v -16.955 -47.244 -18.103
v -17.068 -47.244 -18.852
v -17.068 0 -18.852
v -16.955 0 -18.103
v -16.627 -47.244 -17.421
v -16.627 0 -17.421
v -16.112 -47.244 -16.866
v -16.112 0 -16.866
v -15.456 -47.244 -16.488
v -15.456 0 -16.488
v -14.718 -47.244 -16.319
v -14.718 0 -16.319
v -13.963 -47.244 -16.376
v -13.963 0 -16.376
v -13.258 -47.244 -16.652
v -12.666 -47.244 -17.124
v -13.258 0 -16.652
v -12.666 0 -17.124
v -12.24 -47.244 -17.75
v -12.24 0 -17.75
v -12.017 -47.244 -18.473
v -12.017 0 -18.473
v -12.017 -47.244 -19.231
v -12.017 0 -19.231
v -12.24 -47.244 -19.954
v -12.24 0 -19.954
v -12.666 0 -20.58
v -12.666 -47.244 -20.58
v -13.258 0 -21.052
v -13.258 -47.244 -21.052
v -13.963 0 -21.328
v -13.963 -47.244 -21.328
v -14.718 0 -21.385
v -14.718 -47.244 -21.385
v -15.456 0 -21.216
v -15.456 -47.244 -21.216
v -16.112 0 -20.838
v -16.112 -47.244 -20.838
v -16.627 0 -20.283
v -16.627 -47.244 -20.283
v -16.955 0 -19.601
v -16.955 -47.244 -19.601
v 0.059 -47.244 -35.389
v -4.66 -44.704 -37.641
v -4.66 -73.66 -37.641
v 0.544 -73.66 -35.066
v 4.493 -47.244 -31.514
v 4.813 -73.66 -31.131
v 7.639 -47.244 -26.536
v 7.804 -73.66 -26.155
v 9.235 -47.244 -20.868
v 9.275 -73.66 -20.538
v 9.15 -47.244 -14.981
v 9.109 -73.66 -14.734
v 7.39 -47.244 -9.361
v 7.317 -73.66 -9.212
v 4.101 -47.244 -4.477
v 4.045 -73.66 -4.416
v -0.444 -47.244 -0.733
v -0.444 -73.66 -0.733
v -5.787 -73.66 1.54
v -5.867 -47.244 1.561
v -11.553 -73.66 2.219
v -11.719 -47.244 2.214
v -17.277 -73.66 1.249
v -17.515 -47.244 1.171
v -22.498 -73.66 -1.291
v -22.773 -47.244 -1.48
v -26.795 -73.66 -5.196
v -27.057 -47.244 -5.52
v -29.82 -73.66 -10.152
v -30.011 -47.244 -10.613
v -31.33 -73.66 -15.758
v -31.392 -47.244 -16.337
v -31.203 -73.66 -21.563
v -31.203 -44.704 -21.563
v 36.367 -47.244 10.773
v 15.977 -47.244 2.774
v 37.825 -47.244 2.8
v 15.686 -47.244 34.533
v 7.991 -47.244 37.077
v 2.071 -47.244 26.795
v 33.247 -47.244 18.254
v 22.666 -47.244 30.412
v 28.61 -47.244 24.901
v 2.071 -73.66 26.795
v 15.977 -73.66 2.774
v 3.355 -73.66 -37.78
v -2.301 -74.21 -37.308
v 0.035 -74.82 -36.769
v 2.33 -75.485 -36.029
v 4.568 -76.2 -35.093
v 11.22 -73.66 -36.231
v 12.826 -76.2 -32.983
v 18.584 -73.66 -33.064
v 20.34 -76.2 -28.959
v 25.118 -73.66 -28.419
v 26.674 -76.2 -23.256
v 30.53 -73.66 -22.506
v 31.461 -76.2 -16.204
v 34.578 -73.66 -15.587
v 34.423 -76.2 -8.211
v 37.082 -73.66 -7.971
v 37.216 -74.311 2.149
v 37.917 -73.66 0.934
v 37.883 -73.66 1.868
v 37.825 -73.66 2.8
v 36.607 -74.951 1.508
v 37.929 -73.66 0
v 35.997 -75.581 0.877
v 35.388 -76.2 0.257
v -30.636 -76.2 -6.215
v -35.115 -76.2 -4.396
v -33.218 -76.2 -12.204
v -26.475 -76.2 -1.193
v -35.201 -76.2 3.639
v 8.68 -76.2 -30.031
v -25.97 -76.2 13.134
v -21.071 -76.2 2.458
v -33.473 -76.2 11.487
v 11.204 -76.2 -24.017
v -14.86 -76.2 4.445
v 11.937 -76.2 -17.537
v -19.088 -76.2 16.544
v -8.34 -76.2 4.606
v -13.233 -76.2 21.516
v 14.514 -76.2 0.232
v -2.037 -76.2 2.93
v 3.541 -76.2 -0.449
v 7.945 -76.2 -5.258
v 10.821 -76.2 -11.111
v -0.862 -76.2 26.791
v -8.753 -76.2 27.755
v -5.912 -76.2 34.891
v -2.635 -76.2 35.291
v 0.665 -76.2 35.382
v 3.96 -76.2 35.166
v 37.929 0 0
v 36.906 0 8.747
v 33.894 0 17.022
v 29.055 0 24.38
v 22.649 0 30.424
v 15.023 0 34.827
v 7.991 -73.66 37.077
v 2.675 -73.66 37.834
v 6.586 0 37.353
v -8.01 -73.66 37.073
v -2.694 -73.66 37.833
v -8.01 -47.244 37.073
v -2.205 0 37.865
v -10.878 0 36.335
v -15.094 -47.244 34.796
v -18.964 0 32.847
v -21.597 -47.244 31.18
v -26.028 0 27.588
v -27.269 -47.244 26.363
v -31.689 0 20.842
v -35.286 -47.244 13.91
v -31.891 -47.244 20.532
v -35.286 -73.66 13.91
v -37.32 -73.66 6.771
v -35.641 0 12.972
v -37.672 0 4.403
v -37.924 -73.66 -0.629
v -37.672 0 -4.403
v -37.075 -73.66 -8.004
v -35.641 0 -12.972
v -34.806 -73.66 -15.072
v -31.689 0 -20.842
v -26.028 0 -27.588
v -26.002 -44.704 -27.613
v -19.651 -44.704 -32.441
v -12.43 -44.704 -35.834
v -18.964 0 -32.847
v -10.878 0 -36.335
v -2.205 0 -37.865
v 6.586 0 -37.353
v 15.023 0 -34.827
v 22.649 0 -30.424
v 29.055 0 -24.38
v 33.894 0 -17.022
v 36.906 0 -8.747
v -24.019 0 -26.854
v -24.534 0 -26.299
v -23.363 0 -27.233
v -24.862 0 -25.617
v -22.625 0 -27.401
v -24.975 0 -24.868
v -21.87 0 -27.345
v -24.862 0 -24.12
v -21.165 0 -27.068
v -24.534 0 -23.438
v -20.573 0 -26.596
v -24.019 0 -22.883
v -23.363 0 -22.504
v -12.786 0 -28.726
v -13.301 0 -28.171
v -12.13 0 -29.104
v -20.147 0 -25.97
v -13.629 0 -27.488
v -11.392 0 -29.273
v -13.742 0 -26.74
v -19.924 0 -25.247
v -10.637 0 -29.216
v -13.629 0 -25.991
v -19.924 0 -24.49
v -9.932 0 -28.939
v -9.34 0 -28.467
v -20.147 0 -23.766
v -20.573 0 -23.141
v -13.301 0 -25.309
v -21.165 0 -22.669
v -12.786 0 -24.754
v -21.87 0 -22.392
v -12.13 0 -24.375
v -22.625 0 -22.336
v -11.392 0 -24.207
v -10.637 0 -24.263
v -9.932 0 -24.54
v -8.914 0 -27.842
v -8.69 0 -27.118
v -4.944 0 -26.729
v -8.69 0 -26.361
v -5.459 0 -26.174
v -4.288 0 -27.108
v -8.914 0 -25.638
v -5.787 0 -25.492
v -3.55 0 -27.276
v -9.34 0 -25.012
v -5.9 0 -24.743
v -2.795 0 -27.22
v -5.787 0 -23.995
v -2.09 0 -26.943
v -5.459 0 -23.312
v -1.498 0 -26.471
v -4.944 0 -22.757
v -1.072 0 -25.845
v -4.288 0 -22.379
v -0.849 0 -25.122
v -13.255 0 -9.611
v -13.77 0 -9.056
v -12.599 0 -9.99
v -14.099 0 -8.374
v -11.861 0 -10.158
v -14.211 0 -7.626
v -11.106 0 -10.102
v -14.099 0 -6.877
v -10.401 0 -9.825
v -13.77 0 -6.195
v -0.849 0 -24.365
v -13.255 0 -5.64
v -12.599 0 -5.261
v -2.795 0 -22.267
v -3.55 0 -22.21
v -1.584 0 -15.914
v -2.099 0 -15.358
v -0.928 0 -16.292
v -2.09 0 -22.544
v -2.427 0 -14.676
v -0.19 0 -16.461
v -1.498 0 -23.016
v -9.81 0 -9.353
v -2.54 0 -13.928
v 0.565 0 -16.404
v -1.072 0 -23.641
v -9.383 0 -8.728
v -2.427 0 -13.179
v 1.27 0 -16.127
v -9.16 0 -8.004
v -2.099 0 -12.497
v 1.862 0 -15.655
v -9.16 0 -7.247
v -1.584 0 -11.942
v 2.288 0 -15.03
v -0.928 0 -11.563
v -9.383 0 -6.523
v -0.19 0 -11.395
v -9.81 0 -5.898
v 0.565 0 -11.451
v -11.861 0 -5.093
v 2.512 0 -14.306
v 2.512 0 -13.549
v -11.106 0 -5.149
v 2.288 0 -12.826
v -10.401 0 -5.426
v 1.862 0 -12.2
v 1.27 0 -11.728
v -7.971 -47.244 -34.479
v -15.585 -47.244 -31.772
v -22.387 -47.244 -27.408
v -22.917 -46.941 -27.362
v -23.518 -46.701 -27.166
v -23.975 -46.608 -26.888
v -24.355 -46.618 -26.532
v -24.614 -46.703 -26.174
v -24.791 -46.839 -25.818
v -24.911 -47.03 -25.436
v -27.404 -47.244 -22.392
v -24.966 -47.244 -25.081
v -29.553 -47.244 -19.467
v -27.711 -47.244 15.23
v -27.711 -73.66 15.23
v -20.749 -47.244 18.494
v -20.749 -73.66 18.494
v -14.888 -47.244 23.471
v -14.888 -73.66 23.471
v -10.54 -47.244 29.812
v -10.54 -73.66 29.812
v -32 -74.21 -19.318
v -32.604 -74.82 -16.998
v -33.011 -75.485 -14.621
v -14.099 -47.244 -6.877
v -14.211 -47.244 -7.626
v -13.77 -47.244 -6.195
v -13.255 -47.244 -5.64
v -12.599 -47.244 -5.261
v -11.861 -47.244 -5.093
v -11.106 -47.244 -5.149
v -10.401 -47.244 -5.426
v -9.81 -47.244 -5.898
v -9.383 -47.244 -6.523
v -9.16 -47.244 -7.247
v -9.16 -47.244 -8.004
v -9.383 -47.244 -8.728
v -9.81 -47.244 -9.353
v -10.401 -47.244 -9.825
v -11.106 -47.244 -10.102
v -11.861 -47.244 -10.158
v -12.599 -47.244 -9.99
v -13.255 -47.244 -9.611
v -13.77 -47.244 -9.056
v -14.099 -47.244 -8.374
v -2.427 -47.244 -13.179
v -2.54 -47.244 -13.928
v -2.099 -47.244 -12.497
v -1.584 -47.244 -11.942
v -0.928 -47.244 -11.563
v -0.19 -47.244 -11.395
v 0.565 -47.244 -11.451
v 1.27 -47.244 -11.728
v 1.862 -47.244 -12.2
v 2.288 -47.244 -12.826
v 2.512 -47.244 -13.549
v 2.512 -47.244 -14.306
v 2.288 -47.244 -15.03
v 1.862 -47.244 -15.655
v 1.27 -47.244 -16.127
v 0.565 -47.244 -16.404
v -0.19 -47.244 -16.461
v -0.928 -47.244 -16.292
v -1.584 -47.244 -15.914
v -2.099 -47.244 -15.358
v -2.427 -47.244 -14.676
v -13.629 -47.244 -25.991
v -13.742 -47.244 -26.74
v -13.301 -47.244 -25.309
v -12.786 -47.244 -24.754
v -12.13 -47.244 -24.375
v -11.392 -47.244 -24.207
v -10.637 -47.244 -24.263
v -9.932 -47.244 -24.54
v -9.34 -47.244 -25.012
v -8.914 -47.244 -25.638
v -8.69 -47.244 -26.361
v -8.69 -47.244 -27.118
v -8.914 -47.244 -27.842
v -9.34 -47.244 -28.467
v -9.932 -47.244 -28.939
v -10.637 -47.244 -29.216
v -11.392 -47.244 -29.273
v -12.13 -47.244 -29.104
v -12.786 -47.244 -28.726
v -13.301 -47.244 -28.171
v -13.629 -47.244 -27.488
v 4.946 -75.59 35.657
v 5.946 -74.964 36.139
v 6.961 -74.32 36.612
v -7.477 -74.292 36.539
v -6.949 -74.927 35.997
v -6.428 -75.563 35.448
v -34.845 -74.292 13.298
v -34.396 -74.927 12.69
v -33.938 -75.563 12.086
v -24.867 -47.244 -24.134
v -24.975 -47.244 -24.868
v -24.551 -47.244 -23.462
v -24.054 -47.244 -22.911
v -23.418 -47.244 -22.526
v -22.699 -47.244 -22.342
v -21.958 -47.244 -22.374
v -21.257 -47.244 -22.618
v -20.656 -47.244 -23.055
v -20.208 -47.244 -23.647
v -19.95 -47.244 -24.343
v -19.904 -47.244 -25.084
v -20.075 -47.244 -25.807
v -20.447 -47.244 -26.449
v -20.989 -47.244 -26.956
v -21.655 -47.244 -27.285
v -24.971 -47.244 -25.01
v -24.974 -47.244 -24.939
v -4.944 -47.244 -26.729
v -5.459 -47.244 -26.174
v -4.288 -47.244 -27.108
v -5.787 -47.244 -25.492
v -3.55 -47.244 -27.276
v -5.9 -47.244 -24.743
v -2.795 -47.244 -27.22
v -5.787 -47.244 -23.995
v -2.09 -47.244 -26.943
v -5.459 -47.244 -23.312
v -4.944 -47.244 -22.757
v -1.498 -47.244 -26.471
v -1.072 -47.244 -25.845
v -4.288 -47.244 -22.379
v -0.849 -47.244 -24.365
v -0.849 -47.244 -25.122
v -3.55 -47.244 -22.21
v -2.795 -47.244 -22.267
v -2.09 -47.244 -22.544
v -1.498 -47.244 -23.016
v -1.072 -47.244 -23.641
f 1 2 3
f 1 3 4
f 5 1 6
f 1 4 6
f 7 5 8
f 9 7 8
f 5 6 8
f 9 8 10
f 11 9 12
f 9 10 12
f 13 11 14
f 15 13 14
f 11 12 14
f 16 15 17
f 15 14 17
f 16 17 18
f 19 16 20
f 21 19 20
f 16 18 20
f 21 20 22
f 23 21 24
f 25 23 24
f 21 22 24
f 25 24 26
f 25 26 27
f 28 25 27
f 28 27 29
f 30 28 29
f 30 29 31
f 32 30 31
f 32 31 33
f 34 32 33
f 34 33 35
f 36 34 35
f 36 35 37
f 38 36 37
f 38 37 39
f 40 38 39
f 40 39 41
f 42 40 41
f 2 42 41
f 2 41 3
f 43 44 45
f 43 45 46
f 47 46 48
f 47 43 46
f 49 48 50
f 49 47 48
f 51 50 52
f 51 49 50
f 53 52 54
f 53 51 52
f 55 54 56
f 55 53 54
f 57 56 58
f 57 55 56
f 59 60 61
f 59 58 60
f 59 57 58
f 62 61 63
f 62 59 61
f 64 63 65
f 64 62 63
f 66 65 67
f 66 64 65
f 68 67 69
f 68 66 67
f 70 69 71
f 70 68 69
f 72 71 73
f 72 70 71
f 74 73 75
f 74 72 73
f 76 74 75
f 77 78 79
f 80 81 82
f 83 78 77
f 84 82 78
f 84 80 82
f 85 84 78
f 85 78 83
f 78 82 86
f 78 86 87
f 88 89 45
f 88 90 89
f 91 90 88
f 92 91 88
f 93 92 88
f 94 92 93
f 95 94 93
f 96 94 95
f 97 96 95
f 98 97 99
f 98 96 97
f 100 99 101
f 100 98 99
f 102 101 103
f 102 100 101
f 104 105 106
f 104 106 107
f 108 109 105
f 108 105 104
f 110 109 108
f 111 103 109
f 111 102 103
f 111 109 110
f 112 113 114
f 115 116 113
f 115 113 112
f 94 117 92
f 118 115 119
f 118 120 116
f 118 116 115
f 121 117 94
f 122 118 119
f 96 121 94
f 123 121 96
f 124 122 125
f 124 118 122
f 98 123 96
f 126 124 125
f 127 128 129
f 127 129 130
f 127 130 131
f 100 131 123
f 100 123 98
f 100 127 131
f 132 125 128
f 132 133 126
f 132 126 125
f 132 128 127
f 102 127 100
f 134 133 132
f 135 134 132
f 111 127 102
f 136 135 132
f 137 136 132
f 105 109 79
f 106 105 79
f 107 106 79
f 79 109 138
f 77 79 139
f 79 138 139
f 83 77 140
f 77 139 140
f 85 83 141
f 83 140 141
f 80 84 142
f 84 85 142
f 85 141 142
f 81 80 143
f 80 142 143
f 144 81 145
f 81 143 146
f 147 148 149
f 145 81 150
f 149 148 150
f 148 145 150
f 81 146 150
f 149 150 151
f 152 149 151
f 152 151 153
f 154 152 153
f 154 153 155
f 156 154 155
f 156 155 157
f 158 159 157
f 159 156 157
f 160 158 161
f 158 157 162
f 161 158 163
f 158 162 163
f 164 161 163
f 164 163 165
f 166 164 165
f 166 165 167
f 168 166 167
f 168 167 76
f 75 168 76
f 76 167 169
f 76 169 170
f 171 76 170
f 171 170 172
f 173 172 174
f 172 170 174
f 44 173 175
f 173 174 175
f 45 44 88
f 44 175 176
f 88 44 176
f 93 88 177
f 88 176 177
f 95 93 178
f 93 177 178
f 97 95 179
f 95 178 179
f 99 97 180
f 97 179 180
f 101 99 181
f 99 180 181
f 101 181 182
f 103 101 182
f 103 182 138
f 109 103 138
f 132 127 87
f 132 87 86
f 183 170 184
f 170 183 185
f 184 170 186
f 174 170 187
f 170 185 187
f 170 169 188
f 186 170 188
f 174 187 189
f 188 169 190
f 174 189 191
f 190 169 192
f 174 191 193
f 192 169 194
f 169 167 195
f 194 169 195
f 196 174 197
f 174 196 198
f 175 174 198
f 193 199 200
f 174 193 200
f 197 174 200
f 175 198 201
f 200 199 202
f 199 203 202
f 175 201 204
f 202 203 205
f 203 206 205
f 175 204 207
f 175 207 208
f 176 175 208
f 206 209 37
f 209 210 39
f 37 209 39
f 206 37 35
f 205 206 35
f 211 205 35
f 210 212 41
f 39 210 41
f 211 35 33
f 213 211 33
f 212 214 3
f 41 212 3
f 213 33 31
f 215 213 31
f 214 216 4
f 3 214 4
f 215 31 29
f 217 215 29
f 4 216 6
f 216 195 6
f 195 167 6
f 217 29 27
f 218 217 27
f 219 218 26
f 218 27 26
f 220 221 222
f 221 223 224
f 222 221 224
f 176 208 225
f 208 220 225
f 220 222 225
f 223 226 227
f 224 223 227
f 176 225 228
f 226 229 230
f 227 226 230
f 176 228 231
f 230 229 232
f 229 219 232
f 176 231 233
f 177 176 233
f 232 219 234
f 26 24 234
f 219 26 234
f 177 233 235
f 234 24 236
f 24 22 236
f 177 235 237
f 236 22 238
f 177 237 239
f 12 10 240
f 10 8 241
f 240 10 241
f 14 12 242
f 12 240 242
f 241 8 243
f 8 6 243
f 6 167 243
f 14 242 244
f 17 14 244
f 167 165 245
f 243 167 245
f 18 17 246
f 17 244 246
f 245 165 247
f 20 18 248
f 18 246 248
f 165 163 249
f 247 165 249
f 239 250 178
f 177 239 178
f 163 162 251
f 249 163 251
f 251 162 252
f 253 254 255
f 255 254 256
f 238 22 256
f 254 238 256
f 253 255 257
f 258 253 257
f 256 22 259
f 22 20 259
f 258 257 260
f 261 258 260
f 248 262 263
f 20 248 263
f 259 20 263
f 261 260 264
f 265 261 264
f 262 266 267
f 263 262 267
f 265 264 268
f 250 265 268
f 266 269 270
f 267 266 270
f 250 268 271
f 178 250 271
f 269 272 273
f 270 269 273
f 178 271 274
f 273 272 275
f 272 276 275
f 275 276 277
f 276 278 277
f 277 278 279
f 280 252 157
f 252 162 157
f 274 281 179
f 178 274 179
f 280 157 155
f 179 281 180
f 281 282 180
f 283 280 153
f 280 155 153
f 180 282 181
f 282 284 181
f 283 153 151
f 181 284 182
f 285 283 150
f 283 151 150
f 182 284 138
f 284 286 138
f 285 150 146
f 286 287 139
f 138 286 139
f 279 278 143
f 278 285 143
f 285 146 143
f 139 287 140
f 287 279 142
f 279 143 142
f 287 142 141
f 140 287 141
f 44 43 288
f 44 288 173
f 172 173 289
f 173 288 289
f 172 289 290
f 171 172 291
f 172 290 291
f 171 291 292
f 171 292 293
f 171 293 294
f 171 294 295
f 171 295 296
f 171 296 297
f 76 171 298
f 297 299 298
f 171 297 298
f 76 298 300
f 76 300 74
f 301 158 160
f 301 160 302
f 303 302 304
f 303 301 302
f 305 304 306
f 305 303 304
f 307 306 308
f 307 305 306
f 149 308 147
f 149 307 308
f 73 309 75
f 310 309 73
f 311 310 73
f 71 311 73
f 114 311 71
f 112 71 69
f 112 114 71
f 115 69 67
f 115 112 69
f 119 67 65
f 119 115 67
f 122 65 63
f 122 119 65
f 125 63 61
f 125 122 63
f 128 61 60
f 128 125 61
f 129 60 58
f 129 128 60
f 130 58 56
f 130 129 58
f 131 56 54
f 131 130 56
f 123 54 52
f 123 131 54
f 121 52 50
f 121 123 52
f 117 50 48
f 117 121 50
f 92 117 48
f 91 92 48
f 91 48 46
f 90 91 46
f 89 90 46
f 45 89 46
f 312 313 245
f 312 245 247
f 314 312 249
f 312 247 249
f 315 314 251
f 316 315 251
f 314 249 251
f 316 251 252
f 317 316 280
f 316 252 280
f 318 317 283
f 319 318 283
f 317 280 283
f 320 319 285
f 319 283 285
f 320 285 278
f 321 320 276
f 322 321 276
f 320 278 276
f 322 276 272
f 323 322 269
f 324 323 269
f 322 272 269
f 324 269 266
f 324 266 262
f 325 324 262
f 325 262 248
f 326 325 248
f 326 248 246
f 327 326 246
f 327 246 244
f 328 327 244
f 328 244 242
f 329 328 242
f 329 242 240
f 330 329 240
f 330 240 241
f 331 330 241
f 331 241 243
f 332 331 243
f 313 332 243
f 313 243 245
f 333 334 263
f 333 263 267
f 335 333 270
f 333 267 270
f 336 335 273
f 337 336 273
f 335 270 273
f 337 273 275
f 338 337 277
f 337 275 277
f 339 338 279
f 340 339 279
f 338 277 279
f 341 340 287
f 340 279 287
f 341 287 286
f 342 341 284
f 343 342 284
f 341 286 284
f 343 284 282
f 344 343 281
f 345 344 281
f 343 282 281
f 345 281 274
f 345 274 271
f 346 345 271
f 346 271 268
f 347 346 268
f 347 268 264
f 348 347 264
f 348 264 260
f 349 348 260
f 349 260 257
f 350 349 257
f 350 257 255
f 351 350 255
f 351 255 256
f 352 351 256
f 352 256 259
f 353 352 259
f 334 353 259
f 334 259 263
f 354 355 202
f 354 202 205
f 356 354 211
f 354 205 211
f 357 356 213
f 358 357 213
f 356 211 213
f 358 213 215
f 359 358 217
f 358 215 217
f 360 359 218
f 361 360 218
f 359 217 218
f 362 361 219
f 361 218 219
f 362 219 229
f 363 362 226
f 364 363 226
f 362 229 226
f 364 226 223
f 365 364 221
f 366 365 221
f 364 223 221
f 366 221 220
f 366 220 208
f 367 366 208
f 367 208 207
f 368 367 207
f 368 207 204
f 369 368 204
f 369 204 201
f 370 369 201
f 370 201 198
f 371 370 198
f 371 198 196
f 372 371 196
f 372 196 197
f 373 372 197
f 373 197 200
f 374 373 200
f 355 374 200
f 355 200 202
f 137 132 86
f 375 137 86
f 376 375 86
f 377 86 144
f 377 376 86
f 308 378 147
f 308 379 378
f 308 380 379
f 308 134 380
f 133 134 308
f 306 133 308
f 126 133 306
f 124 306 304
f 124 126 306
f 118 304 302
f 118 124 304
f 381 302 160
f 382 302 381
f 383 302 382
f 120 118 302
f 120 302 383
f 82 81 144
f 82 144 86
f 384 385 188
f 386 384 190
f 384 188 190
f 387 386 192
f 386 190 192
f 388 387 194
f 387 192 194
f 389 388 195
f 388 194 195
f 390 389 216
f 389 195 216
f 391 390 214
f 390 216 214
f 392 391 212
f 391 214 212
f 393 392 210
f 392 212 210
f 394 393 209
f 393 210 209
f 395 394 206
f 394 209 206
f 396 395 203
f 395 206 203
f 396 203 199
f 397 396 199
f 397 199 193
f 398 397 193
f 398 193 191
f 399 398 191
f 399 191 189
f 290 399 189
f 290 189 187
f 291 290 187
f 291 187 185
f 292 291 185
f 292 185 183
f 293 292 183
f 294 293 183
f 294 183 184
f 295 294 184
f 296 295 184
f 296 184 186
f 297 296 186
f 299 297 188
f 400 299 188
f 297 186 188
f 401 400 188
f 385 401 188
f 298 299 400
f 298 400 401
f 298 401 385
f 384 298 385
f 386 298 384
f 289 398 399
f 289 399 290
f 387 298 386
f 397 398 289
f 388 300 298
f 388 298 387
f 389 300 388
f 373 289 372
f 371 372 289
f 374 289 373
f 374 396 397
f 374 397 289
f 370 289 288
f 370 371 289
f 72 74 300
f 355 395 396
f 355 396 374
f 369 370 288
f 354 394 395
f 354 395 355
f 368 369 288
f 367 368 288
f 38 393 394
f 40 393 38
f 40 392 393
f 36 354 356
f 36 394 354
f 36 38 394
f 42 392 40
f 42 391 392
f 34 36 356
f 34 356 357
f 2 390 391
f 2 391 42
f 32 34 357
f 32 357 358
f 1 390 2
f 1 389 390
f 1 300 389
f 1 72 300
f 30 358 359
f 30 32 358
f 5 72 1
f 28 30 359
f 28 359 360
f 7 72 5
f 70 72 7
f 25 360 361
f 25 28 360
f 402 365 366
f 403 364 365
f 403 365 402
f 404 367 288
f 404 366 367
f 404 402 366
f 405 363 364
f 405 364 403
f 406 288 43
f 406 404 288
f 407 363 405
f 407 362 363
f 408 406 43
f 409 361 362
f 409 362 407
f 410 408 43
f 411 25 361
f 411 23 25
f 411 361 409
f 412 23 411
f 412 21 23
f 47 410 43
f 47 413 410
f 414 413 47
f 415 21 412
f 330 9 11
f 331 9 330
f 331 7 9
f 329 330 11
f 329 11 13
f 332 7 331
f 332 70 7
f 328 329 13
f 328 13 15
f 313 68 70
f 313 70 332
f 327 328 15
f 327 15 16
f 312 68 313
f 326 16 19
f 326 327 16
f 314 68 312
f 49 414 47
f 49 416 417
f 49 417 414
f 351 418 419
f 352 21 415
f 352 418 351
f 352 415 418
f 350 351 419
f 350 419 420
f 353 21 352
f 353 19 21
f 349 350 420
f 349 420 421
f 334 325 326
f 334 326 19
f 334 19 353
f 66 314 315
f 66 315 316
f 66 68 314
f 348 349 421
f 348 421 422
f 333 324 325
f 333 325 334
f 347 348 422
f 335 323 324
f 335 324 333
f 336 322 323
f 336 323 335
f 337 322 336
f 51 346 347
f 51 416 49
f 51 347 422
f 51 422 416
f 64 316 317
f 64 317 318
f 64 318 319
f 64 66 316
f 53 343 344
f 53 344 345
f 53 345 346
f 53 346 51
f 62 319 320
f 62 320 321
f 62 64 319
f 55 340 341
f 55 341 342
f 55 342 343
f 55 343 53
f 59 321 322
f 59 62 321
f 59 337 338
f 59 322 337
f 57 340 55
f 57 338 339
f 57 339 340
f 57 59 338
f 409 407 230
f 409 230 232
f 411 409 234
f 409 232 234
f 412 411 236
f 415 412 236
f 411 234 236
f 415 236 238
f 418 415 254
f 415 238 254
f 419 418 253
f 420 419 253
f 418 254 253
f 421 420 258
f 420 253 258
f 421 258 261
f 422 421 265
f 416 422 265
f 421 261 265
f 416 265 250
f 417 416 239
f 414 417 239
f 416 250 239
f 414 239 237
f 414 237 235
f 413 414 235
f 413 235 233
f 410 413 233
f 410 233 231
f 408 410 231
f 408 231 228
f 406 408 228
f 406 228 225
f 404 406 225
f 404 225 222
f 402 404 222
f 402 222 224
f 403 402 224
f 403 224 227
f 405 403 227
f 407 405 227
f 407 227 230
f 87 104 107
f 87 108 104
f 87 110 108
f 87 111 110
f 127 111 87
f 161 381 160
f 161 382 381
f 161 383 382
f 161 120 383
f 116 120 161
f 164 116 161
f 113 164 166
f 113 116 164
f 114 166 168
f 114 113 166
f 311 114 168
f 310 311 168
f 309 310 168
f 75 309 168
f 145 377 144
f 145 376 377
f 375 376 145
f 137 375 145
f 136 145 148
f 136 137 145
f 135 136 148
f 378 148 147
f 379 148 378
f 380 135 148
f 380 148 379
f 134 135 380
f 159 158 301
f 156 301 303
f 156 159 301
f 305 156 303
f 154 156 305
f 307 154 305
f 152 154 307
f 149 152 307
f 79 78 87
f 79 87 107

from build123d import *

# Parameters (mm, degrees)
F0_R        = 37.9287365184
F1_DEPTH    = 76.2
F3_R        = 20.4430640503
F4_DEPTH    = 43.688
F5_SIZE     = 2.54
F7_D        = 5.08
F8_T4_ANGLE = 68.0337710329
F8_S5_R     = 20.4430640503
F8_T6_DEPTH = 23


# Not quite as in the source:
# - a fillet or chamfer that OpenCascade refuses, or shapes differently, is made with other operations: its cross-section is extruded or revolved along the edge and cut away or added


with BuildPart() as f1:
    # F0 (on Front) → F1 (new body)
    with BuildSketch(Plane.XZ):
        Circle(F0_R)
    extrude(amount=F1_DEPTH)

    # F3 (on offset) → F4 (cut)
    with BuildSketch(Plane.XZ.offset(47.244)):
        with BuildLine():
            Line((-7.417100016, 52.0775169134), (-39.2948538065, 52.0775169134))
            Line((-39.2948538065, 52.0775169134), (-39.2948538065, 13.8873383403))
            Line((-39.2948538065, 13.8873383403), (-36.437637775, 13.8873383403))
            ThreePointArc((-36.437637775, 13.8873383403), (-15.9170187319, 22.3872570562), (-7.417100016, 42.9078760992))
            Line((-7.417100016, 42.9078760992), (-7.417100016, 52.0775169134))
        make_face()
        Polygon((43.7327071249, 2.8074141011), (57.5817332447, 26.8609896883), (43.6752387942, 50.8813859194), (15.9197182239, 50.8482065633), (2.070692104, 26.794630976), (15.9771865545, 2.7742347449), align=None)
        with Locations((-11.0355066136, -18.2179771364)):
            Circle(F3_R)
    extrude(amount=F4_DEPTH, mode=Mode.SUBTRACT)

    # F5
    f5_edges = [f1.edges().sort_by_distance(p)[0] for p in [
        (25.118202, -76.2, -28.419448),
        (37.902848, -76.2, 1.401132),
        (26.901202, -76.2, 2.787293),
        (9.023939, -76.2, 14.784433),
        (5.030877, -76.2, 31.936005),
        (-0.009512, -76.2, 37.928735),
        (-17.652727, -76.2, 20.787326),
        (-37.679979, -76.2, -4.336848),
        (-0.443827, -76.2, -0.732692),
    ]]
    chamfer(f5_edges, length=F5_SIZE)

    # F7 (through all)
    with Locations(Plane.XZ.offset(47.244)):
        with Locations((-11.6714835167, -7.6255151071), (0, -13.9276552945), (-14.5282614976, -18.8519991934), (-3.3601692412, -24.743270129), (-11.2020578235, -26.739705354), (-22.4352385849, -24.8684193939)):
            Hole(F7_D / 2)

    # F8: chamfer of 2.54 on 1 edges, made by hand


with BuildPart() as f8_tool2:
    # F8_s3 → F8_t4 (revolve)
    with BuildSketch(Plane(origin=(0, 0, 0), x_dir=(0, 1, 0), z_dir=(0.9987962472, 0, 0.0490515704))):
        Polygon((-44.704, -37.9287365184), (-47.244, -35.3887365184), (-47.244, -37.9287365184), align=None)
    revolve(axis=Axis((0, -47.244, 0), (0, 1, 0)), revolution_arc=F8_T4_ANGLE)

    # F8_s5 → F8_t6 (intersect, symmetric)
    with BuildSketch(Plane.XZ.offset(46)):
        with Locations((-11.0355066136, -18.2179771364)):
            Circle(F8_S5_R)
    extrude(amount=F8_T6_DEPTH, both=True, mode=Mode.INTERSECT)


with BuildPart() as f1_1:
    add(f1.part)

    # F8_t1: cut F8_tool2
    add(f8_tool2.part, mode=Mode.SUBTRACT)


solid = f1_1.part
